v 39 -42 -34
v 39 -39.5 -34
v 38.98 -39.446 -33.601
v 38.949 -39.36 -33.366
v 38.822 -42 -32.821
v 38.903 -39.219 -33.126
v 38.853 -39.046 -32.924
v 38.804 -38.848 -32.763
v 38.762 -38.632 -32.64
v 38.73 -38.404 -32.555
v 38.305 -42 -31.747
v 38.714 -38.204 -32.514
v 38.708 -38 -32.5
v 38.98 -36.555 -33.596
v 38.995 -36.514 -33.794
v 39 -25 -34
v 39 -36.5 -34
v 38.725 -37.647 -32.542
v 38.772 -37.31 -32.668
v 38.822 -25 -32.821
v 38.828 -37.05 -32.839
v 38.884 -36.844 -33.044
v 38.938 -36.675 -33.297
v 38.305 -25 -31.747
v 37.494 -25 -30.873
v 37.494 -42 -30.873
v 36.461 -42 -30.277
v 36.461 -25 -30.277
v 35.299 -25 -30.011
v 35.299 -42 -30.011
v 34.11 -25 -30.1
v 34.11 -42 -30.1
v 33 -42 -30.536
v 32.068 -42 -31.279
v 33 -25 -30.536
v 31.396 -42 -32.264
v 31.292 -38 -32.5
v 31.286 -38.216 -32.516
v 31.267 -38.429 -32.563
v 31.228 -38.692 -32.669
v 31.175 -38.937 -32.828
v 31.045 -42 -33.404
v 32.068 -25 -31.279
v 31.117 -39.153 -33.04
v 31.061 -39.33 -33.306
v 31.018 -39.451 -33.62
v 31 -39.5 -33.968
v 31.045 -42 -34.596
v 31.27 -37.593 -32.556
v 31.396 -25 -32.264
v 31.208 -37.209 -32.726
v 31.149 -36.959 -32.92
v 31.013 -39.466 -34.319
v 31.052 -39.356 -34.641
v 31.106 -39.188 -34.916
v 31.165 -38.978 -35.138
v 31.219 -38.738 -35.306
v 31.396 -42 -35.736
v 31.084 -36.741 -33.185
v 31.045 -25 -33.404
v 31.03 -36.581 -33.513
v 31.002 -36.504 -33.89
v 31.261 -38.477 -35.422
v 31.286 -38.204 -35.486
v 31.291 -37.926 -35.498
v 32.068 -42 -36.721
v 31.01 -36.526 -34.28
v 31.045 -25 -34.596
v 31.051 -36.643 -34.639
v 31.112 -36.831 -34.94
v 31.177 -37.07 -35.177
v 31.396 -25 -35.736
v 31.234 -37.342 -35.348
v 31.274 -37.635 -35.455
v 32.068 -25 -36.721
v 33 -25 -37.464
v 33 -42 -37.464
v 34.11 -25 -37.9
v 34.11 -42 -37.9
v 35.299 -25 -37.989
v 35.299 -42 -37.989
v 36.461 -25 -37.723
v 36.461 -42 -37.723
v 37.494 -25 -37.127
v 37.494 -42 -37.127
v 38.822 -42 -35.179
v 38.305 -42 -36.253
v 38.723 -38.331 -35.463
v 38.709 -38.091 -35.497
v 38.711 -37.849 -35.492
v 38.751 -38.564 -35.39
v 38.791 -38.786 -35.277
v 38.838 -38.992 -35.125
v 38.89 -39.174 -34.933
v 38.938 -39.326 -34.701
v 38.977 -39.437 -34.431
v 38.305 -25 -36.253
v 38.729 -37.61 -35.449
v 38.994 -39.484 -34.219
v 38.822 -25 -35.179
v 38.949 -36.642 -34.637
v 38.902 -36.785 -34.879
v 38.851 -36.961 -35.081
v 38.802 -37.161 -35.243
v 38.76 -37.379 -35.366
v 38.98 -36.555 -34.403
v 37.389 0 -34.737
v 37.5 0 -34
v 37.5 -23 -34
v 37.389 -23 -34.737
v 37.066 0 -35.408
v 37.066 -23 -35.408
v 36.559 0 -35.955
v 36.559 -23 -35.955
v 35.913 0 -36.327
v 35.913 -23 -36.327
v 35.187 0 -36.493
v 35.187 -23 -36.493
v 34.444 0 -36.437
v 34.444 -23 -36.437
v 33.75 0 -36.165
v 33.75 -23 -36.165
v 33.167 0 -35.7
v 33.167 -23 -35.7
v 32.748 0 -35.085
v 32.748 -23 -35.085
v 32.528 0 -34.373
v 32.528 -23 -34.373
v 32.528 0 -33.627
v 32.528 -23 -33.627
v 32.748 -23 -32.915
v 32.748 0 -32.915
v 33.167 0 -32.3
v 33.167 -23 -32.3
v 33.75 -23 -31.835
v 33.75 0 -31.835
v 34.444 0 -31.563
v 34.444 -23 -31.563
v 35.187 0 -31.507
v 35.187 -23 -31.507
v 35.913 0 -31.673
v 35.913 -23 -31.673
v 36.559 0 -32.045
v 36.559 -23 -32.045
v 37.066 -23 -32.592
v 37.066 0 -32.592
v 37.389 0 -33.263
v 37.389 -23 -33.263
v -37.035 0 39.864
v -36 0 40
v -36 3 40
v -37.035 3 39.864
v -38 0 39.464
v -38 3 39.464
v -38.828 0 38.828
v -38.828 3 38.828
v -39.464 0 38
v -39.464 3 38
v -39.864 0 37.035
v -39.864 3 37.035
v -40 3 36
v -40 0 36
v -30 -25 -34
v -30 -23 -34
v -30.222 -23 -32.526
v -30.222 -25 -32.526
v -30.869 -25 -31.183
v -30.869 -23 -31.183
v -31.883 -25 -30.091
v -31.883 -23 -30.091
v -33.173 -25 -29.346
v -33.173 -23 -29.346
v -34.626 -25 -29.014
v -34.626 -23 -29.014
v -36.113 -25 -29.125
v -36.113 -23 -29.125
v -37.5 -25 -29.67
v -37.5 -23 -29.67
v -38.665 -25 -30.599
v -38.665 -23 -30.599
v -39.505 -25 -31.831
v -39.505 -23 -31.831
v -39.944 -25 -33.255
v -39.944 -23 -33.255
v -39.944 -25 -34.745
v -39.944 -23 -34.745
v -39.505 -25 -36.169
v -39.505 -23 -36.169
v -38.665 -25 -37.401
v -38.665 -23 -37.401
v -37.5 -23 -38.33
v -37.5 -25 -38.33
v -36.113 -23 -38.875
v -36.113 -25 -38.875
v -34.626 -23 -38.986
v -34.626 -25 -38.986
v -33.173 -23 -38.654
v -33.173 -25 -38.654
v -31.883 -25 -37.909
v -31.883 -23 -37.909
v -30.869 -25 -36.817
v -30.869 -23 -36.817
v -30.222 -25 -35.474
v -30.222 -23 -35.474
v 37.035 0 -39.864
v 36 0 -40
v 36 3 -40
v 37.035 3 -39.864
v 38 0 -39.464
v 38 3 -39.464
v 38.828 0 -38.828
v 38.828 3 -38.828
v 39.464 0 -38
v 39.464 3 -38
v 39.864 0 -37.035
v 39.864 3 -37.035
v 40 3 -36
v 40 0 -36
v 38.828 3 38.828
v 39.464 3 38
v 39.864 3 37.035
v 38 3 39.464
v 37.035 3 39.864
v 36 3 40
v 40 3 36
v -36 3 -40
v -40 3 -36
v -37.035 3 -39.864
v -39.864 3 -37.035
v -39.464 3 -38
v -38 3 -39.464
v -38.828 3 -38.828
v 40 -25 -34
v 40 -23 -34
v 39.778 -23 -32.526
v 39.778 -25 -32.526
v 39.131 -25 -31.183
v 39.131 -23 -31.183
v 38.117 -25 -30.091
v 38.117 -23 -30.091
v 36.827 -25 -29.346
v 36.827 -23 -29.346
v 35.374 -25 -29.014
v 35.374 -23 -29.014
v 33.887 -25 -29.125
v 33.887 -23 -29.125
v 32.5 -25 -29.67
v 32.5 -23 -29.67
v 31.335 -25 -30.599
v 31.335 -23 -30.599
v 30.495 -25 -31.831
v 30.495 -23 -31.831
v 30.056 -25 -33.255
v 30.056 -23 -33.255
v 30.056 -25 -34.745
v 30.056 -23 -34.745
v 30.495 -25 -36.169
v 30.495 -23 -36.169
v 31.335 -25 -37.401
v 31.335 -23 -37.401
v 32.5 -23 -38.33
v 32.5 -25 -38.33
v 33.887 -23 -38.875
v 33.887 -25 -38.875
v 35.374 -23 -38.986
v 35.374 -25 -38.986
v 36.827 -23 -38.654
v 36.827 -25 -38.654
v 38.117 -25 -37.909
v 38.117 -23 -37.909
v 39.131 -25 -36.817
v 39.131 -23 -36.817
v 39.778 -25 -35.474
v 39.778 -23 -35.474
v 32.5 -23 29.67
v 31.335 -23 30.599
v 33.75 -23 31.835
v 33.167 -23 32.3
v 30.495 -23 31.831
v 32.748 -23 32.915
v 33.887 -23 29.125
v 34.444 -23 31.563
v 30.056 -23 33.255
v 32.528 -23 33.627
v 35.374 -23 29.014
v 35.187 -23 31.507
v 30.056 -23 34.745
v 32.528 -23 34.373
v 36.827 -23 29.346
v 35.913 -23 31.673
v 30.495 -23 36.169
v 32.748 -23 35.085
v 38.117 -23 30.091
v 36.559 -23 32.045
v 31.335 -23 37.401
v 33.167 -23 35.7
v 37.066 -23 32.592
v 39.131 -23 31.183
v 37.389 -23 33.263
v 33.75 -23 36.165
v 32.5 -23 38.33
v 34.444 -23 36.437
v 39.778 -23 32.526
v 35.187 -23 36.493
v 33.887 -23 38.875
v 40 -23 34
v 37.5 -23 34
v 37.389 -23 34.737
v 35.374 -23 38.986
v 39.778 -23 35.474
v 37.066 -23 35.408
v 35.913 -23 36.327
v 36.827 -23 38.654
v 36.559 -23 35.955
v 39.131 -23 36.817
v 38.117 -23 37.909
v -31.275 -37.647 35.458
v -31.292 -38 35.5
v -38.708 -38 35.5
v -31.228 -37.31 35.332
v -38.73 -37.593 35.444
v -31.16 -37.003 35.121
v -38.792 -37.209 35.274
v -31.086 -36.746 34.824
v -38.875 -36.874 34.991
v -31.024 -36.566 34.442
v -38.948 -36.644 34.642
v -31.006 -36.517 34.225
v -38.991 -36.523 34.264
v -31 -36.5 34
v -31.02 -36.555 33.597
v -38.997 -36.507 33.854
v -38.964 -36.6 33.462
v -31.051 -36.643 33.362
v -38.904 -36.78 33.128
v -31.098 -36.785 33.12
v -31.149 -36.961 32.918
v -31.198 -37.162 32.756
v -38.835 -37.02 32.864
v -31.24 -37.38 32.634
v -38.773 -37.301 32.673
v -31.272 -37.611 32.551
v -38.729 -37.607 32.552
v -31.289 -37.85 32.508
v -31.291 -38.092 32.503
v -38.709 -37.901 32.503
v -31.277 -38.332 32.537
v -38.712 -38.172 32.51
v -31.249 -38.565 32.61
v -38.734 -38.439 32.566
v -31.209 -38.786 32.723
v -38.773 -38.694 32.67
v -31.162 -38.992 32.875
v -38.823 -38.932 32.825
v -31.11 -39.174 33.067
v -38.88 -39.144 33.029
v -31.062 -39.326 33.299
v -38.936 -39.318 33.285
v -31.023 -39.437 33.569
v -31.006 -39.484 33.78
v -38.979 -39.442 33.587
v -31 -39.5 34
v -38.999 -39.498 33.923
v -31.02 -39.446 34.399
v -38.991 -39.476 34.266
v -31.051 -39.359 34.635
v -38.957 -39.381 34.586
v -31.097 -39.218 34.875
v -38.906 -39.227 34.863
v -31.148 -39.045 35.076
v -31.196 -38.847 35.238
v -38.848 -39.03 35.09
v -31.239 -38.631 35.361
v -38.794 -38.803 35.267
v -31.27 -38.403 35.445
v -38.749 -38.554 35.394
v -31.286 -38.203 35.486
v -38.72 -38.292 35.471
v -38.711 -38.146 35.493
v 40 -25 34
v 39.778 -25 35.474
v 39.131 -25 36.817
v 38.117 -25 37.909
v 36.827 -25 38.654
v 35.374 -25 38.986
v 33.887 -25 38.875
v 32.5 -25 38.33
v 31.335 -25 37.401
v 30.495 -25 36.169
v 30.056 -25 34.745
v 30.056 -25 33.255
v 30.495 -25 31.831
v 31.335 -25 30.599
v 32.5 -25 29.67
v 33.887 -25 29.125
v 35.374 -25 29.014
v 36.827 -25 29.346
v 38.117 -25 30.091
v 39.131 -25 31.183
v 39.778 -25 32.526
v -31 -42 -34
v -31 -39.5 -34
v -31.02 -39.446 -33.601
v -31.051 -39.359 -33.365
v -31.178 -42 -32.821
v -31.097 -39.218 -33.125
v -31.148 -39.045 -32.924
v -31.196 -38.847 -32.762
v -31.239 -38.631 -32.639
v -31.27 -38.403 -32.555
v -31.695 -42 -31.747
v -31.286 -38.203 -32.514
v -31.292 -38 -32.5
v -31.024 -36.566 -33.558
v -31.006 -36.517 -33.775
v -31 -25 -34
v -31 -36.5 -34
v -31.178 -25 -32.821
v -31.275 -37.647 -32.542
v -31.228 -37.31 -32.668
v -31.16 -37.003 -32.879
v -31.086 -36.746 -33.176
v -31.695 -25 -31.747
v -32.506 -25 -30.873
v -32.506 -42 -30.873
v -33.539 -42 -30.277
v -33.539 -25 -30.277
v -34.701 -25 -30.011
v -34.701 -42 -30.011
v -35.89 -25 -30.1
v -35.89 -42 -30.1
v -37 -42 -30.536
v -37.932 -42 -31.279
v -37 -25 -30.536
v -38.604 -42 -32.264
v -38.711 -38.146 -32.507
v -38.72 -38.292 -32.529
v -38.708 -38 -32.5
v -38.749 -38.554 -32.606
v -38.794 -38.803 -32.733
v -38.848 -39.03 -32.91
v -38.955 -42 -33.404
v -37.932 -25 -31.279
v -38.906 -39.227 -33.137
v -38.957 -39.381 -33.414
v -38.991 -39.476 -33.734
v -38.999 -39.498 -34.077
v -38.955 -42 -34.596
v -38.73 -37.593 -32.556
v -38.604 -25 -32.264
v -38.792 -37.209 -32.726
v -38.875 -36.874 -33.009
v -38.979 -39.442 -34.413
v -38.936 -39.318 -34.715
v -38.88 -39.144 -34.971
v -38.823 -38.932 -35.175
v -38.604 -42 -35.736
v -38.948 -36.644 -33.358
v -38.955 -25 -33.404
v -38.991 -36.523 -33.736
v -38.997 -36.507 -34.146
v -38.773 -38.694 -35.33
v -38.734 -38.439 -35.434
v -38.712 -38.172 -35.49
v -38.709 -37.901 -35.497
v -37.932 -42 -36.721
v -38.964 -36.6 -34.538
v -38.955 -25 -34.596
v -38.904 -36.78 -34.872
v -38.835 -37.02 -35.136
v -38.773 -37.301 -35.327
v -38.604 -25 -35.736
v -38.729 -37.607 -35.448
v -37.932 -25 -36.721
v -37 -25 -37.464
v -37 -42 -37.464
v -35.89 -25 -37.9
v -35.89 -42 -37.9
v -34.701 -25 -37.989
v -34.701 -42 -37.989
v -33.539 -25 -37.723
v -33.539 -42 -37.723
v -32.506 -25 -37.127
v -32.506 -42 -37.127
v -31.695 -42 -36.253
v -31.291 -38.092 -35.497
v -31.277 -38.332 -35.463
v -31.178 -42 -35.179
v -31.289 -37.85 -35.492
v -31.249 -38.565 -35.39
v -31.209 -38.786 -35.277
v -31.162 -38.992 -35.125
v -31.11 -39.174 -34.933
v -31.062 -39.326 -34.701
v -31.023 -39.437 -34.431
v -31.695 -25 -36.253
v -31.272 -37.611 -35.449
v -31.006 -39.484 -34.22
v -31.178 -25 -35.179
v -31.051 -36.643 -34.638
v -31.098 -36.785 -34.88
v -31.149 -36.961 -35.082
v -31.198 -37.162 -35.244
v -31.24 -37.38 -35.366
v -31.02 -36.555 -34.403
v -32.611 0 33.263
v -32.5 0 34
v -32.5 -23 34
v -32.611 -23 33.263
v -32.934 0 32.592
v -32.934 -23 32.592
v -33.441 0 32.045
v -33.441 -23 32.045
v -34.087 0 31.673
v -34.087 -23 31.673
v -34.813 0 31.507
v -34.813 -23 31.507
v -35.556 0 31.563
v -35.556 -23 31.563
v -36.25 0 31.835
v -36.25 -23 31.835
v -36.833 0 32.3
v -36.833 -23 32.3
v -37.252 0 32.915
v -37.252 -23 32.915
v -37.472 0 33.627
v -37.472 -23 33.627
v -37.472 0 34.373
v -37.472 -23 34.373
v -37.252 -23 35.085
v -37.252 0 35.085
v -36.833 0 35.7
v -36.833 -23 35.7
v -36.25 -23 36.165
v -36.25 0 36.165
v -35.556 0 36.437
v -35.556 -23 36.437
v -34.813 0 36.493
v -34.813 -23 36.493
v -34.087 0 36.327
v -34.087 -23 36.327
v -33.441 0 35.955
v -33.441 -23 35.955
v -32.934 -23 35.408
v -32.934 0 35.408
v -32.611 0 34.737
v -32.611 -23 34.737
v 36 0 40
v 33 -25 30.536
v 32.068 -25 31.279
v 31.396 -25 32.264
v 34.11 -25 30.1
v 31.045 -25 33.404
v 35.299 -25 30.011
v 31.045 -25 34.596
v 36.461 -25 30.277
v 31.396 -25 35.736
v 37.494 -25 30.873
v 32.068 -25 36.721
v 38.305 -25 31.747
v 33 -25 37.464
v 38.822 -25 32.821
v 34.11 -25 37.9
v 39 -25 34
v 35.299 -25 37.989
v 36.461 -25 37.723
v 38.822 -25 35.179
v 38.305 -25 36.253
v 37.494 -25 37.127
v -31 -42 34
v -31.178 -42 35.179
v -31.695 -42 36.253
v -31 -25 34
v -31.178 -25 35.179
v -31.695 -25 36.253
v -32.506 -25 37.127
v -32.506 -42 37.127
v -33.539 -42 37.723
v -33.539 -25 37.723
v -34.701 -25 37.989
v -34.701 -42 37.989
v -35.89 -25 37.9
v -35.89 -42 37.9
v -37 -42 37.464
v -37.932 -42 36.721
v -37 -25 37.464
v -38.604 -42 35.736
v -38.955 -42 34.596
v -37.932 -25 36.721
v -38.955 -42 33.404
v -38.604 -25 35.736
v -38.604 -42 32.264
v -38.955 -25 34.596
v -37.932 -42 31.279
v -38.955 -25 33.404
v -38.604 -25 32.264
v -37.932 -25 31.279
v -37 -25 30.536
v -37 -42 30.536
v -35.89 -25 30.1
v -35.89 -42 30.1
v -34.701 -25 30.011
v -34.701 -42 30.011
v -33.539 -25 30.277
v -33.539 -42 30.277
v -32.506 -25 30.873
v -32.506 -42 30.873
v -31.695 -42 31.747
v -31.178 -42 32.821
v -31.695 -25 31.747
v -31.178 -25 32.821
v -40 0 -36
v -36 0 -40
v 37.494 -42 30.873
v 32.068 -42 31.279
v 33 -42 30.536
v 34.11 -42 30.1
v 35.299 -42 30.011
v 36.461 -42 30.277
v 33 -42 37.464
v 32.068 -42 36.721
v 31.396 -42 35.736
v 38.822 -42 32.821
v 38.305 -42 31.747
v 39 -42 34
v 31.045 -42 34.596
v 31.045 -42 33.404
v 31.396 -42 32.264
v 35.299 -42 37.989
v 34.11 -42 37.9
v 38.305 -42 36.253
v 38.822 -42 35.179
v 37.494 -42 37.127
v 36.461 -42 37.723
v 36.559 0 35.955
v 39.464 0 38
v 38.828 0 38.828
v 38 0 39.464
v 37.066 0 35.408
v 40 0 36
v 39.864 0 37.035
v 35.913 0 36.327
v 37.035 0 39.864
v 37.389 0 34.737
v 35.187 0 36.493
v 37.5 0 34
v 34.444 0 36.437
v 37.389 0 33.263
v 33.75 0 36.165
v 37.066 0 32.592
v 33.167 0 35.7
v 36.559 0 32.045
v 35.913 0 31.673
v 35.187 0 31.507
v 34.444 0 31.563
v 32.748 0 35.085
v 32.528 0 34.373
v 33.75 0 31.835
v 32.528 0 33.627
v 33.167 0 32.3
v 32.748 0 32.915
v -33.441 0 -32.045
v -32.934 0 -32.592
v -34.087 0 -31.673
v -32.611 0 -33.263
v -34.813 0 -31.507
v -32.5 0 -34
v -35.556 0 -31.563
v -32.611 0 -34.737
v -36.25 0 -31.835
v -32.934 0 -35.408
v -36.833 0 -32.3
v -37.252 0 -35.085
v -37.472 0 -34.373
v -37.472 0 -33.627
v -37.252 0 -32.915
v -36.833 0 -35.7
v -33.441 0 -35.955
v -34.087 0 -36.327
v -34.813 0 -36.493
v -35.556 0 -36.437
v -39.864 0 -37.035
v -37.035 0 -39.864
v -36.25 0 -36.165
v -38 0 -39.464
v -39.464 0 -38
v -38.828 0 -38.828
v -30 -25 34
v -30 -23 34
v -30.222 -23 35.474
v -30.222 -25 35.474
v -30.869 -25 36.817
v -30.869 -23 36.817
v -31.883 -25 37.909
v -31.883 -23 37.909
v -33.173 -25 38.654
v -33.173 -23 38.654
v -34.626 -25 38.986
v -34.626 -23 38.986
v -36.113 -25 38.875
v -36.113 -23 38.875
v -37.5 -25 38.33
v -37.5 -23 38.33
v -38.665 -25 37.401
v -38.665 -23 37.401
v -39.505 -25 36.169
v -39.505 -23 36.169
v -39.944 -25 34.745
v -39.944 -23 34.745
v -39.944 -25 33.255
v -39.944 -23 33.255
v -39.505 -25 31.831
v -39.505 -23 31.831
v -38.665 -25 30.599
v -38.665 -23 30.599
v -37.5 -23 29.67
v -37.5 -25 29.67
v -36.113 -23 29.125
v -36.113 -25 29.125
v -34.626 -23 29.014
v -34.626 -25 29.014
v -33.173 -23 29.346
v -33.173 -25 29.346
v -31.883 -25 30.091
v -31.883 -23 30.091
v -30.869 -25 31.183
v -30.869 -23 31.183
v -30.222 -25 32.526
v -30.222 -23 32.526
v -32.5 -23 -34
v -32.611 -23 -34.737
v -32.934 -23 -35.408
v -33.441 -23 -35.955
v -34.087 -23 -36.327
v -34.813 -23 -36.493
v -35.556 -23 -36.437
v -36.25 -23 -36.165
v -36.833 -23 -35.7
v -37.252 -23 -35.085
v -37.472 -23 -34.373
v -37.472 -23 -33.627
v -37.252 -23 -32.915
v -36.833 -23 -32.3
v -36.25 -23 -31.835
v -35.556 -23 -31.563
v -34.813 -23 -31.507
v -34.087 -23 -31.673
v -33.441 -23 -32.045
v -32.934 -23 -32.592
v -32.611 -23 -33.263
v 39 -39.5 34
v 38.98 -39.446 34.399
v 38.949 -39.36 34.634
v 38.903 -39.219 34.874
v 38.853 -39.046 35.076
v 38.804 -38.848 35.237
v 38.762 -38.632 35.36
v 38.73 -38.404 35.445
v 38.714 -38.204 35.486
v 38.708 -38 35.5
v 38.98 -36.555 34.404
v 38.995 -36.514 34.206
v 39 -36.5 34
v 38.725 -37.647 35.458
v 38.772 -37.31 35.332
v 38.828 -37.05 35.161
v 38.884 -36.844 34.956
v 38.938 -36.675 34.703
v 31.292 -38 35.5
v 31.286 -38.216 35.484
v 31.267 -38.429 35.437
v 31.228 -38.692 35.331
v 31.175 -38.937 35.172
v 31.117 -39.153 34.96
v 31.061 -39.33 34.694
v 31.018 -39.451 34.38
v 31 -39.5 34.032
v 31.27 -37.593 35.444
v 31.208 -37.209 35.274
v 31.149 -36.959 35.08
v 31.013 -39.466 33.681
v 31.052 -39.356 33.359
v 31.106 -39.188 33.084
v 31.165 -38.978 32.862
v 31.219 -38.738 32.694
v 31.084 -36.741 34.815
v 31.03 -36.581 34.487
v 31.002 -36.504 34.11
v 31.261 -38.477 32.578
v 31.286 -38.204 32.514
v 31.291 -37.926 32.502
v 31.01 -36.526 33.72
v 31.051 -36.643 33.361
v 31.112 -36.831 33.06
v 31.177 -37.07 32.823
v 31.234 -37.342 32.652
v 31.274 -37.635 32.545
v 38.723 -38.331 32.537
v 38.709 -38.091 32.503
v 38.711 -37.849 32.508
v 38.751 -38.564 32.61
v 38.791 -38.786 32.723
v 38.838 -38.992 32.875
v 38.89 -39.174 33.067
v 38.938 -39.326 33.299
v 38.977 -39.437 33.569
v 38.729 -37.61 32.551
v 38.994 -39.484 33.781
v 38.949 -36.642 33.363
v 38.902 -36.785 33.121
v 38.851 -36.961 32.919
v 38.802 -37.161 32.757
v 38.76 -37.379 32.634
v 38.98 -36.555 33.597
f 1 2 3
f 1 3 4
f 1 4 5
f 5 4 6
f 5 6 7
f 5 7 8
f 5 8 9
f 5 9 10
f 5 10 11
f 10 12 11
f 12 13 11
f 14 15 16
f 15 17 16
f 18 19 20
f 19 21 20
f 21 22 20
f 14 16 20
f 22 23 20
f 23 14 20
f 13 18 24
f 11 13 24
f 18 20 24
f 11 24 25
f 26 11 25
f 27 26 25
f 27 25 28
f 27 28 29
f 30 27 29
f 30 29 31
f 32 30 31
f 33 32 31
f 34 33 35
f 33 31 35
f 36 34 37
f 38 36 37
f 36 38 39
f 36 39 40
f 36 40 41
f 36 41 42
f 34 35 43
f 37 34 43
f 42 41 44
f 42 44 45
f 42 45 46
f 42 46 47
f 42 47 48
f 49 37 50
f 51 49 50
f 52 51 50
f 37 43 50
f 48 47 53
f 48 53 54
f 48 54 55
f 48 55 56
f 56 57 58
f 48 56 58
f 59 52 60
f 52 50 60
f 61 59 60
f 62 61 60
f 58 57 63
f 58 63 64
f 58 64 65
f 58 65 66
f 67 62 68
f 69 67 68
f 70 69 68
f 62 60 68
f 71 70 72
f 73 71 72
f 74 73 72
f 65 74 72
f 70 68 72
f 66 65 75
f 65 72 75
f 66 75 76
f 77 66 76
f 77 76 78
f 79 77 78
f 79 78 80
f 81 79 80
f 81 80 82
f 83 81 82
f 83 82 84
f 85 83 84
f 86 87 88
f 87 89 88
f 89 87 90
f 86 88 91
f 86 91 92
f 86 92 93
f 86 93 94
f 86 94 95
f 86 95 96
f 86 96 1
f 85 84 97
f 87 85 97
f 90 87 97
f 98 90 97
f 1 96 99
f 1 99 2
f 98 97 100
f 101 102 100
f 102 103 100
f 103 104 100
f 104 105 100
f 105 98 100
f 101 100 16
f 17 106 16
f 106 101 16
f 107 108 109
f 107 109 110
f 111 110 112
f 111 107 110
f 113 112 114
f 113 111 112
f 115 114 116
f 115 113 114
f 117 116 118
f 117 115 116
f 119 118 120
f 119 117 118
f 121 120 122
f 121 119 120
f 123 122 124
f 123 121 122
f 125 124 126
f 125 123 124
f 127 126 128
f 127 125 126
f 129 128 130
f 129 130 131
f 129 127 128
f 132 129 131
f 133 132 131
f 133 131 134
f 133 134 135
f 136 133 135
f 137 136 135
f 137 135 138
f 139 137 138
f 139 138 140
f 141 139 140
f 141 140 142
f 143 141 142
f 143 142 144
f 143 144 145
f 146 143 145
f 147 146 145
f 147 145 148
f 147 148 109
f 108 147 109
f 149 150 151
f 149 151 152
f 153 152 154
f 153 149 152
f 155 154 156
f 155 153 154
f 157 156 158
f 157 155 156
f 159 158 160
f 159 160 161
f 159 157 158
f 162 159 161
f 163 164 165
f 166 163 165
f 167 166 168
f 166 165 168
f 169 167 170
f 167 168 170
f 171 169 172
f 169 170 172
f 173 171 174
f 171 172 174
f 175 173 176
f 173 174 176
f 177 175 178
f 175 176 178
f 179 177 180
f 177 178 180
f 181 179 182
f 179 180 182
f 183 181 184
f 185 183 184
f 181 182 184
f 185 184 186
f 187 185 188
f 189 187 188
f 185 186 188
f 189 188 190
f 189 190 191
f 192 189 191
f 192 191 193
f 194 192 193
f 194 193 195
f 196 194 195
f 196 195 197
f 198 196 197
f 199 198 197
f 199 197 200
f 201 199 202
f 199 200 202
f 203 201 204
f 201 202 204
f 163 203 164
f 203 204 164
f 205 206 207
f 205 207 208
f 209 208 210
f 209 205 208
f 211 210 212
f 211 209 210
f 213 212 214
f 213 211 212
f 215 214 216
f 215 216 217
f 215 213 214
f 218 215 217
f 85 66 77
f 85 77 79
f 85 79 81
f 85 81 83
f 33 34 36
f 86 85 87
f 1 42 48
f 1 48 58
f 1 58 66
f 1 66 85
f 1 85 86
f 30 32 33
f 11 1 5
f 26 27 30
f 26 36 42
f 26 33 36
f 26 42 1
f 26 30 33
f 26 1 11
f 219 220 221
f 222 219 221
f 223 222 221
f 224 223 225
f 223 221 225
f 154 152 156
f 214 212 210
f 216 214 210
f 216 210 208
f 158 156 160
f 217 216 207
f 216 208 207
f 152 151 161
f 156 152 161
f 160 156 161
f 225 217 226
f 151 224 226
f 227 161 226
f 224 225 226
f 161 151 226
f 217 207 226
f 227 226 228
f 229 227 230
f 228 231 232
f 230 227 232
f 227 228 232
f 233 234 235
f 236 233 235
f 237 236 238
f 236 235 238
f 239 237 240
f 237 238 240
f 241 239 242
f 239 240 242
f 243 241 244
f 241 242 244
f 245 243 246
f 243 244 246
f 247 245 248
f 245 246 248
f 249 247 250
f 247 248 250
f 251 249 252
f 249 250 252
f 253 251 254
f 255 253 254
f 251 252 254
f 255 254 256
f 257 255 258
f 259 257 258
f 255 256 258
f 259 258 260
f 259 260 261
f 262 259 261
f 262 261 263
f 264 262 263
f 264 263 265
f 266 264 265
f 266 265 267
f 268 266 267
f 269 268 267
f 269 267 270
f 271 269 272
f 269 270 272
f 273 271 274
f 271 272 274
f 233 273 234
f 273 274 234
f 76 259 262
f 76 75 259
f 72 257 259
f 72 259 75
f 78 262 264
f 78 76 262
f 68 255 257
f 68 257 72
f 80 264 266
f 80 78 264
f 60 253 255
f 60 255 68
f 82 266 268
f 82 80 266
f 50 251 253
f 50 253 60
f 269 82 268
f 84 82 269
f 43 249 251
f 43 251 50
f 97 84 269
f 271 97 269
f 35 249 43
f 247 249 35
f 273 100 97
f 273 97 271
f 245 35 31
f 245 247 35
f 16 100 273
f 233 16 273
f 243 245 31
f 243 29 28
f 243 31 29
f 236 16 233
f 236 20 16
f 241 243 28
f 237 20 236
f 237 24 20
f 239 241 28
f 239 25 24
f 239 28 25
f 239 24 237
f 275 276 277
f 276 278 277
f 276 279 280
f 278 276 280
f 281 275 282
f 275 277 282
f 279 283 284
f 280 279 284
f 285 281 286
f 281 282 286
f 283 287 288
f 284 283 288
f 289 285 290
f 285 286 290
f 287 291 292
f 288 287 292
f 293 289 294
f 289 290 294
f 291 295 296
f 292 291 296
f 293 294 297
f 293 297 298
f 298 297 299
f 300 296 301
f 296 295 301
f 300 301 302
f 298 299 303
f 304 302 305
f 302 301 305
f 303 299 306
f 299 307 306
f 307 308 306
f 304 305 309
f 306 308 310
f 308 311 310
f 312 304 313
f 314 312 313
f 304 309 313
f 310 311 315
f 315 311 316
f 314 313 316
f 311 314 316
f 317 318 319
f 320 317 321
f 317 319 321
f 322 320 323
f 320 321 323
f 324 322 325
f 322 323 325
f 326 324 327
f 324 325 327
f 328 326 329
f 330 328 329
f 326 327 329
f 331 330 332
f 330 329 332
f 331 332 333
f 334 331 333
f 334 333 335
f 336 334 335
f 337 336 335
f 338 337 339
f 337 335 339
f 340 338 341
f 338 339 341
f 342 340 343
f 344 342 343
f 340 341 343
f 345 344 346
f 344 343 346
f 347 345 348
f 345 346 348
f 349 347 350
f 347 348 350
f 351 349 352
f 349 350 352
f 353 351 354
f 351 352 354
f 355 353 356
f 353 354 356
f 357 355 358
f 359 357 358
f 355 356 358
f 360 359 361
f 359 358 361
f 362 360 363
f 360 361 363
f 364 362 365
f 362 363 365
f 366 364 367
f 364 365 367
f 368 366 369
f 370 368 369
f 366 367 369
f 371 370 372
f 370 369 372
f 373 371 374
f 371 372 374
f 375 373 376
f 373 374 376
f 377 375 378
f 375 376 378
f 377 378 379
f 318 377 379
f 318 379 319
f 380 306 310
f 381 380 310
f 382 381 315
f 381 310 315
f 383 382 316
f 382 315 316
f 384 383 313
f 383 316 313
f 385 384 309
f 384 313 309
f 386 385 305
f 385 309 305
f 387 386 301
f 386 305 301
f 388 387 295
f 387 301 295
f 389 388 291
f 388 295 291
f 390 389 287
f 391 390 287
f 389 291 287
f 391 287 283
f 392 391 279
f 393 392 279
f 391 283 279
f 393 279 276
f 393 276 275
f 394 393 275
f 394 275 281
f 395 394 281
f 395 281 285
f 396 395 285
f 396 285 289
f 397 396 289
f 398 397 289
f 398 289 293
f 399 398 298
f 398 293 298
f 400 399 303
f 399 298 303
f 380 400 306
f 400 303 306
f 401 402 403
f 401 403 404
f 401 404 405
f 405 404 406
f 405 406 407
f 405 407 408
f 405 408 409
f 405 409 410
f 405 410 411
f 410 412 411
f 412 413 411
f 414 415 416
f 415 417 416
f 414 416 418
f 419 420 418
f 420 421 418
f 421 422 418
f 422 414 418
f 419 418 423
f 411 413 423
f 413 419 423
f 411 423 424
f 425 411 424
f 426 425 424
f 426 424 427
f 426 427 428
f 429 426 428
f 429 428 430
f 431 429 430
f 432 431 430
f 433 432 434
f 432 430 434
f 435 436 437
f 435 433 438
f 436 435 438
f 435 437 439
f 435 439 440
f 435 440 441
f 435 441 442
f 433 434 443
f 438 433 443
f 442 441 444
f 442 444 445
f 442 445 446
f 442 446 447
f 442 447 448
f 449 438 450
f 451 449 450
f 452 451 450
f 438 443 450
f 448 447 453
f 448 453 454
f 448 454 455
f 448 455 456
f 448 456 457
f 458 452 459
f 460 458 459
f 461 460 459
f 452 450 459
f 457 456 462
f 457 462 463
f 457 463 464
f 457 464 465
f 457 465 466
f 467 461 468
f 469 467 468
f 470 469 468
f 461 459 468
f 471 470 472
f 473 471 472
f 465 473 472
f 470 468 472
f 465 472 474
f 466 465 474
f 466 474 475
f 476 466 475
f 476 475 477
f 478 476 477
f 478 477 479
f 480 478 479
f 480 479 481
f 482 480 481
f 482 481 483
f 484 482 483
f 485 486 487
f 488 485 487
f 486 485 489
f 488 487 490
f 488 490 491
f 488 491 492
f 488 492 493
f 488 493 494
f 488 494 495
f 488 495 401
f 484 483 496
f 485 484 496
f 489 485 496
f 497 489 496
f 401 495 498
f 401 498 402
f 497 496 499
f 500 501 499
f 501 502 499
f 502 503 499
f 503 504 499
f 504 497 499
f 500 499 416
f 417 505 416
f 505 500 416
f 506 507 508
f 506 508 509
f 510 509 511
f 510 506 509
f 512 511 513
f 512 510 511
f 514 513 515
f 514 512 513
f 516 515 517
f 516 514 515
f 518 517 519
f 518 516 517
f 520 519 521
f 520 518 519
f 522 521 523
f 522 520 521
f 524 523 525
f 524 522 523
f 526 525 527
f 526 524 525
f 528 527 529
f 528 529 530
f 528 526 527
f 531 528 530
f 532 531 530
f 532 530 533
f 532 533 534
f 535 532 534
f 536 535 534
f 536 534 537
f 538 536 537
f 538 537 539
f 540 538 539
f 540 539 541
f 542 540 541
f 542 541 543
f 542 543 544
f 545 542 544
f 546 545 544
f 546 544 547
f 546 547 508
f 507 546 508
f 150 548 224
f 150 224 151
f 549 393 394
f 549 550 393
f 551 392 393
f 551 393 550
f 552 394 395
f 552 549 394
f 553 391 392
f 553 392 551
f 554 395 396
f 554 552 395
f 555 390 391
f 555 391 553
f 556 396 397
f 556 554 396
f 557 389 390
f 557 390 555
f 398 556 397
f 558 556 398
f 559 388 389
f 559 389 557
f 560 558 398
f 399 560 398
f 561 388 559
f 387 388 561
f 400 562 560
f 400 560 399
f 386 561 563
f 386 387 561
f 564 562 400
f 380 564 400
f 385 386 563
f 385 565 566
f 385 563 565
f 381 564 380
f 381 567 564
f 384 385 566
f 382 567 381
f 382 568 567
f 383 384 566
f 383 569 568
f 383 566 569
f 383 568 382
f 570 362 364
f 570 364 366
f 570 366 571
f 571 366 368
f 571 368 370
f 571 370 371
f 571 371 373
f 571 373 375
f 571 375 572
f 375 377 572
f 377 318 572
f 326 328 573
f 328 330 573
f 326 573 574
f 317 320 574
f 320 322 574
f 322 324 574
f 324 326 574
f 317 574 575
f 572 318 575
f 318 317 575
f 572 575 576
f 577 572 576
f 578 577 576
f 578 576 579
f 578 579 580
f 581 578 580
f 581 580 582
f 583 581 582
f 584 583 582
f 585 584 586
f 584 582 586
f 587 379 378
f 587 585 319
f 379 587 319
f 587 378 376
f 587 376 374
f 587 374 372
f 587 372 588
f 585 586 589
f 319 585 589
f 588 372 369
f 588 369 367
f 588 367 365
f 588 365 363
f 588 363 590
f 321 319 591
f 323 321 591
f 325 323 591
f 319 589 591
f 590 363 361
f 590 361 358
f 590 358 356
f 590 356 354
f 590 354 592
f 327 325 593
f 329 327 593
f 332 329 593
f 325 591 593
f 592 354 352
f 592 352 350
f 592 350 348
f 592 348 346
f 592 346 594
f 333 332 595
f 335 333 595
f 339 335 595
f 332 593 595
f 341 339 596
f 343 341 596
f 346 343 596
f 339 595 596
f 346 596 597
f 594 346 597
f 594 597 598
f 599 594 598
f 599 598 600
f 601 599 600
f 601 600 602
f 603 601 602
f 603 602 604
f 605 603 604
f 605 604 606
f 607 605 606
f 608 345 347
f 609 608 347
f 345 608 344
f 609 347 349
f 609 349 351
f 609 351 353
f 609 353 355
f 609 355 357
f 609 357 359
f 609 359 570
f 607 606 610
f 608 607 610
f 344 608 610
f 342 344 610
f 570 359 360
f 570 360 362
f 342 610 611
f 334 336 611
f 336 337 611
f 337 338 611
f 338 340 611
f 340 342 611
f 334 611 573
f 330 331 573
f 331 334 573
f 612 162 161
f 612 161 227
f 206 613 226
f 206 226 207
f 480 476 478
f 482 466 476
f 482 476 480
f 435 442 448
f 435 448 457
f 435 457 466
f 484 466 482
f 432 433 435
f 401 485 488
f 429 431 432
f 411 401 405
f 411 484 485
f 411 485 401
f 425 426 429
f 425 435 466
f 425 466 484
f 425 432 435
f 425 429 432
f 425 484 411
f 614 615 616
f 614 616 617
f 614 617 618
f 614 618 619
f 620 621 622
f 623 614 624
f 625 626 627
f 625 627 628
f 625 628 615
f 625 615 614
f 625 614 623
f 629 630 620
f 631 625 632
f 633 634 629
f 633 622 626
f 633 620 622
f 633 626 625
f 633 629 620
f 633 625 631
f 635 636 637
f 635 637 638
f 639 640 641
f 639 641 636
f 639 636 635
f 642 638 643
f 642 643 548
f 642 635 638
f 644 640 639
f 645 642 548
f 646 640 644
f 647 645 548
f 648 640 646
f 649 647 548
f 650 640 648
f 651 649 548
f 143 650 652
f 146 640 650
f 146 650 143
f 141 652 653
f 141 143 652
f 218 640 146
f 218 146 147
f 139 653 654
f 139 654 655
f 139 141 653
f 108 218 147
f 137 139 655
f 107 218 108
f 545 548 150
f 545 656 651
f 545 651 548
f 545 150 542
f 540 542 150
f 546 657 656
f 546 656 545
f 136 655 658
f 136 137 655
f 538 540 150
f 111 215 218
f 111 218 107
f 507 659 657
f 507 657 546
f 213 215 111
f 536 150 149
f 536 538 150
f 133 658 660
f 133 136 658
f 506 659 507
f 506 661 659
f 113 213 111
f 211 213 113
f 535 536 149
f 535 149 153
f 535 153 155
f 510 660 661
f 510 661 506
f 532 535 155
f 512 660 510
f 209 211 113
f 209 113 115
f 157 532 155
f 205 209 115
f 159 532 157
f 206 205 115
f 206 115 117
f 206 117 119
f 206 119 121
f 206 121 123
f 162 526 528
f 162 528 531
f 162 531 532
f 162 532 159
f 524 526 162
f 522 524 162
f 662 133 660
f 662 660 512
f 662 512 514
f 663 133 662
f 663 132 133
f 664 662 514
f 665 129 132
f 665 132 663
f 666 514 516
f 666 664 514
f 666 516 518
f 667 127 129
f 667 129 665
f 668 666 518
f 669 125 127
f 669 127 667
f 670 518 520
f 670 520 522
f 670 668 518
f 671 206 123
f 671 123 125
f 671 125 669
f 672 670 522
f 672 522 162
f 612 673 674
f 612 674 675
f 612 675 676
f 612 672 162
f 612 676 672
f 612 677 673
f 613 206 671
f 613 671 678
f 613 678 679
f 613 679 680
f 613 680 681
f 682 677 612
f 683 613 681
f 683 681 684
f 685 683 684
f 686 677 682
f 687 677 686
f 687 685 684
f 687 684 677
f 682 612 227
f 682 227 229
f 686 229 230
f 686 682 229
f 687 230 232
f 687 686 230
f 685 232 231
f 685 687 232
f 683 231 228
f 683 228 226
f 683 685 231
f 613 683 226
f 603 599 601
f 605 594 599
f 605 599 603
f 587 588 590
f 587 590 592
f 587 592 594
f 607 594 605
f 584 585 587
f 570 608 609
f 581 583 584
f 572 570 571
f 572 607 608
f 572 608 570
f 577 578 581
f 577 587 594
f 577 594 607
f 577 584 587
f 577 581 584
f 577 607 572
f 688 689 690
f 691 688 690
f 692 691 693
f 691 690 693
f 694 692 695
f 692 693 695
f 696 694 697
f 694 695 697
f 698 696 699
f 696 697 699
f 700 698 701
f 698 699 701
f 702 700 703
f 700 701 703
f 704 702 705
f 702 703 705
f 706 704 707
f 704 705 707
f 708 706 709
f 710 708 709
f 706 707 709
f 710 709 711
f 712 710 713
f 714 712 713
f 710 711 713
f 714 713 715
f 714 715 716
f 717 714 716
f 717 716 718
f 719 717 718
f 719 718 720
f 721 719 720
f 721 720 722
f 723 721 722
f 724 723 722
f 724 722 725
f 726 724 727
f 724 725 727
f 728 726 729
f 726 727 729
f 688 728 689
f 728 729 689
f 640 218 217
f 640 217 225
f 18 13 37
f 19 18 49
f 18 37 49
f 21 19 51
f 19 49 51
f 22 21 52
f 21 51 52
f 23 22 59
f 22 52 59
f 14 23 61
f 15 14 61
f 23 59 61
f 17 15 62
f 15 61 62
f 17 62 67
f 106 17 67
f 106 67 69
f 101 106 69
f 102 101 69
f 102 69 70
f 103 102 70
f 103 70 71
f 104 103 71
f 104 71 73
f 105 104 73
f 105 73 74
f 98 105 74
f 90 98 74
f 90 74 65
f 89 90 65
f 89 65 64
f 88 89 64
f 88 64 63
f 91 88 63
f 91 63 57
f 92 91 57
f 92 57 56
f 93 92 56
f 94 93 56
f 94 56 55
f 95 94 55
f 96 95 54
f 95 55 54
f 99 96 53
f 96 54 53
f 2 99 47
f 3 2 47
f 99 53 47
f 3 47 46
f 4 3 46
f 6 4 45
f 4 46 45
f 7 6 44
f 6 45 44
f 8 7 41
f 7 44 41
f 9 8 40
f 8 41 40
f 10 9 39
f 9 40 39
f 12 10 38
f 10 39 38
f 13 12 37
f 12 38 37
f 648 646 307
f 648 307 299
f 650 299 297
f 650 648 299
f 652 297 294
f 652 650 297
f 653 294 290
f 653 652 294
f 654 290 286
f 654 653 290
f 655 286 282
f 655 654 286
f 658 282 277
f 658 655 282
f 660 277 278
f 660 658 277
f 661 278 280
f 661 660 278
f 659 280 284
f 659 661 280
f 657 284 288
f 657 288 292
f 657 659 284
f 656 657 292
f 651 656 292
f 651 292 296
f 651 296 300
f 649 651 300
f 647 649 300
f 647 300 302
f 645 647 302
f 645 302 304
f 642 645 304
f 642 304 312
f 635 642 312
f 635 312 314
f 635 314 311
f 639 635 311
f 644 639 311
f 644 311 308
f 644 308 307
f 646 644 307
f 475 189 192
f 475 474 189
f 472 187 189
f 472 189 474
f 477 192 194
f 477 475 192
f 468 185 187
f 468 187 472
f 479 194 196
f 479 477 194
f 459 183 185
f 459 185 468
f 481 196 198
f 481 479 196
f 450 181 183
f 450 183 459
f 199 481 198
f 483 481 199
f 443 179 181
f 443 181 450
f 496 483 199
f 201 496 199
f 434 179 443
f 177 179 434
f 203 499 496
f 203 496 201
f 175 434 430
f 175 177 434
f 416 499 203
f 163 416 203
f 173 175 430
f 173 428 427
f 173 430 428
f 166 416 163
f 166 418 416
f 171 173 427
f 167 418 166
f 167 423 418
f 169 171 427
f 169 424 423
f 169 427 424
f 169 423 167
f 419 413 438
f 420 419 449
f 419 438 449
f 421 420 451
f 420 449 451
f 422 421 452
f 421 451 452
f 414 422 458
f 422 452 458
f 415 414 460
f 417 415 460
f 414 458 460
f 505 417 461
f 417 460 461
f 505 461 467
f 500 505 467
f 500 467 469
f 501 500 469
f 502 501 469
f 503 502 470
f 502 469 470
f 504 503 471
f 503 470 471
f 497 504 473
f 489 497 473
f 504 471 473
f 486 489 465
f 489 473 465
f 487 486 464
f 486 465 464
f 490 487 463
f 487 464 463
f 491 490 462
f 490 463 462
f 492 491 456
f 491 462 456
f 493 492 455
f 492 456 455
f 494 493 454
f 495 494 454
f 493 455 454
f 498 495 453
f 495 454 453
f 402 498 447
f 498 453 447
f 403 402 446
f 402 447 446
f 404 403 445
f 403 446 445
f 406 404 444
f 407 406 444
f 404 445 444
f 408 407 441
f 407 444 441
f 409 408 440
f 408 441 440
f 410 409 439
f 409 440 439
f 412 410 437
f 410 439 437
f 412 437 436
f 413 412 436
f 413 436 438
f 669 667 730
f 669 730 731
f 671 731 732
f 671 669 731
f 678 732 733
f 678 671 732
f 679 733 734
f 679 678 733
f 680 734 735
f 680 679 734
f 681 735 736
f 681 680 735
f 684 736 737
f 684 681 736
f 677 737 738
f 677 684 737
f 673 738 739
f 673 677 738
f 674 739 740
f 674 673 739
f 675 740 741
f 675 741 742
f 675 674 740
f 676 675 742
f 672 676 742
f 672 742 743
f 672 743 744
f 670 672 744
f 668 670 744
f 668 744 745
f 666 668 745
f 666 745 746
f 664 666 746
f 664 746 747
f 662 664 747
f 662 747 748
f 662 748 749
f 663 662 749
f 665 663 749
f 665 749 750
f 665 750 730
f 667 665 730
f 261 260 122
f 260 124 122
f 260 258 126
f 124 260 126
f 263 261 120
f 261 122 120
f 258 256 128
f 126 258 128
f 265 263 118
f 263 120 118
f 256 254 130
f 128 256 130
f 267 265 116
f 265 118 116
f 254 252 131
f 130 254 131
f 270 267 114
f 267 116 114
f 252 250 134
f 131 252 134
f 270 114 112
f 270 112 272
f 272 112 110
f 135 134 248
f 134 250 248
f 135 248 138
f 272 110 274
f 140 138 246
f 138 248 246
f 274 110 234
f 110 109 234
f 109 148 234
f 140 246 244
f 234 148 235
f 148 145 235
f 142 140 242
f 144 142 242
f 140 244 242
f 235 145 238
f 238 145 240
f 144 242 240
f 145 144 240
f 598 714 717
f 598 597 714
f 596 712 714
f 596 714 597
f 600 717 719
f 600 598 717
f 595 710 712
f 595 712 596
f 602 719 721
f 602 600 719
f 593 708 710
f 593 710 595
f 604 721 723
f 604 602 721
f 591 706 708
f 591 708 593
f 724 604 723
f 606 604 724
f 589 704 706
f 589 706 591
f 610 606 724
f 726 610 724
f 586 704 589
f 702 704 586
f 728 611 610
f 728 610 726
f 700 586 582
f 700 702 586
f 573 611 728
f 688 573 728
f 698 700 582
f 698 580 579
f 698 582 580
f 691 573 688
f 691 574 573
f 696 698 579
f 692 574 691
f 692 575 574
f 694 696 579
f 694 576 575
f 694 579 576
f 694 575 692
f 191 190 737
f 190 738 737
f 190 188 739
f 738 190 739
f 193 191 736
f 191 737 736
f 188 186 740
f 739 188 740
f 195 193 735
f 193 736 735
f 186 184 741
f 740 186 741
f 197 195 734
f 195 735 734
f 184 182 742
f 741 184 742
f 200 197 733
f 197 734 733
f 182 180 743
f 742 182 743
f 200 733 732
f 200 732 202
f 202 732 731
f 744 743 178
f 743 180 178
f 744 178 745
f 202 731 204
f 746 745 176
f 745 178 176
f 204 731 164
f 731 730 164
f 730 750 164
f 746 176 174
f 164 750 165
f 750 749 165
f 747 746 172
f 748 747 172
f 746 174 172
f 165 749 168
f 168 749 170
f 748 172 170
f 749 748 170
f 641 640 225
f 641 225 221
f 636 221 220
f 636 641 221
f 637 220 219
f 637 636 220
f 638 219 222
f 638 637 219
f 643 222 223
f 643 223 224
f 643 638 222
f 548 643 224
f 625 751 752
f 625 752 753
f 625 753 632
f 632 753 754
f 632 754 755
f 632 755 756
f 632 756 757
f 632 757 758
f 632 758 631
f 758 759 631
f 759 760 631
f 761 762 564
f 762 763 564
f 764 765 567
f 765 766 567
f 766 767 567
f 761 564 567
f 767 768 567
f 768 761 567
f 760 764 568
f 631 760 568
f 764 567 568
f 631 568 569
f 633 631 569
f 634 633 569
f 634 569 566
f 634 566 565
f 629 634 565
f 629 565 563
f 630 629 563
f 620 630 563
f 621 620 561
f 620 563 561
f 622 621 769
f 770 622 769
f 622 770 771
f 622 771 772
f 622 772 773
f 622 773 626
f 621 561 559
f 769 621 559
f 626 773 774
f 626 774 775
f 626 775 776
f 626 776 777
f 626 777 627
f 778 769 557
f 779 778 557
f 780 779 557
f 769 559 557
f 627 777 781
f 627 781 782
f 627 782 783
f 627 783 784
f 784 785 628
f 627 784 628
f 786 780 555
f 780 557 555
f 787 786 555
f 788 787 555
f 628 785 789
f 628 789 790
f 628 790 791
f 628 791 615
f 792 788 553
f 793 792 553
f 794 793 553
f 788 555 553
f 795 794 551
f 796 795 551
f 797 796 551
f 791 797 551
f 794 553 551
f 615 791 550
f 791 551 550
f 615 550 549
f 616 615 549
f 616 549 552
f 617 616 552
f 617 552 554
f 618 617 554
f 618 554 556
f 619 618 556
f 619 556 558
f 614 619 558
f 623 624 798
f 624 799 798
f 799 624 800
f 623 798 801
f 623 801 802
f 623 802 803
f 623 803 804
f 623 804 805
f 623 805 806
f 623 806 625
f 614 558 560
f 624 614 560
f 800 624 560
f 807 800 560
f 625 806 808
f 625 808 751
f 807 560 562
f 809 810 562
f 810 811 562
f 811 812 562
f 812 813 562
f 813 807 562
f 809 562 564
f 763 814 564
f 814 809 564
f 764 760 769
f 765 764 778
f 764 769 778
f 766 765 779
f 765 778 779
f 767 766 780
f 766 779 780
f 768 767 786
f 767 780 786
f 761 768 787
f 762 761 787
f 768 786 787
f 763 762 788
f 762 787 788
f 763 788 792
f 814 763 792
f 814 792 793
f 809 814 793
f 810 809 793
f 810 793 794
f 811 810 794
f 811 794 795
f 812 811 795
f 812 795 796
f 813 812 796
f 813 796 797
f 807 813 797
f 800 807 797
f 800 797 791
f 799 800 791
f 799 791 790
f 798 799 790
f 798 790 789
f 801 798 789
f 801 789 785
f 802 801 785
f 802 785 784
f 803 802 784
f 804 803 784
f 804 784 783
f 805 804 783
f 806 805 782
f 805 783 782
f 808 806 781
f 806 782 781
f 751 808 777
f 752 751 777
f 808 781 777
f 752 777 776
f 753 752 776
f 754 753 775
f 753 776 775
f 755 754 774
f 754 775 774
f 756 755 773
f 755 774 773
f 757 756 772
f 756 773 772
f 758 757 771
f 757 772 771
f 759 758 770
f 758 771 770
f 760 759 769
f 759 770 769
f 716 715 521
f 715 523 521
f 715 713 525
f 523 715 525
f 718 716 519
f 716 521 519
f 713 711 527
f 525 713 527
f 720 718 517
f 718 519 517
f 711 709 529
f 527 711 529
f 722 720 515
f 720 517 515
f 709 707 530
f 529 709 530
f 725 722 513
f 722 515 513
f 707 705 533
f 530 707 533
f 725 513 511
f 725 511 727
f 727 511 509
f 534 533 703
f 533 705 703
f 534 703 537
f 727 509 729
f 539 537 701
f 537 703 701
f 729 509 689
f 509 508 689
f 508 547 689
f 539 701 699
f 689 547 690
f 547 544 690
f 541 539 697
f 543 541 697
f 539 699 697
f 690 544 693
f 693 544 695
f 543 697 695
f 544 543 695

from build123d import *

# Parameters (mm, degrees)
SKETCH1_R               = 2.5
BOSS_EXTRUDE1_DEPTH     = 3
SKETCH1_3_R             = 2.5
BOSS_EXTRUDE2_DEPTH     = 42
SKETCH2_R               = 1.5
CUT_EXTRUDE1_DEPTH      = 147
BOSS_EXTRUDE3_START     = 23
SKETCH3_R               = 5
BOSS_EXTRUDE3_DEPTH     = 2
SKETCH4_R               = 4
BOSS_EXTRUDE4_DEPTH     = 17
SKETCH2_3_R             = 1.5
CUT_EXTRUDE2_DEPTH      = 101
CUT_EXTRUDE2_DEPTH_BACK = 130


with BuildPart() as part:
    # Sketch1 → Boss-Extrude1 (new body)
    with BuildSketch(Plane(origin=(0, 0, 0), x_dir=(1, 0, 0), z_dir=(0, 1, 0))):
        with BuildLine():
            ThreePointArc((-40, 36), (-38.828427125, 38.828427125), (-36, 40))
            Line((-36, 40), (36, 40))
            ThreePointArc((36, 40), (38.828427125, 38.828427125), (40, 36))
            Line((40, 36), (40, -36))
            ThreePointArc((40, -36), (38.828427125, -38.828427125), (36, -40))
            Line((36, -40), (-36, -40))
            ThreePointArc((-36, -40), (-38.828427125, -38.828427125), (-40, -36))
            Line((-40, -36), (-40, 36))
        make_face()
        with Locations((35, 34)):
            Circle(SKETCH1_R, mode=Mode.SUBTRACT)
        with Locations((35, -34)):
            Circle(SKETCH1_R, mode=Mode.SUBTRACT)
        with Locations((-35, -34)):
            Circle(SKETCH1_R, mode=Mode.SUBTRACT)
        with Locations((-35, 34)):
            Circle(SKETCH1_R, mode=Mode.SUBTRACT)
        with Locations((-35, 34)):
            Circle(SKETCH1_R)
        with Locations((35, 34)):
            Circle(SKETCH1_R)
        with Locations((-35, -34)):
            Circle(SKETCH1_R)
        with Locations((35, -34)):
            Circle(SKETCH1_R)
    extrude(amount=BOSS_EXTRUDE1_DEPTH)

    # Sketch1<3> → Boss-Extrude2 (add)
    with BuildSketch(Plane(origin=(0, 0, 0), x_dir=(1, 0, 0), z_dir=(0, 1, 0))):
        with Locations((-35, 34)):
            Circle(SKETCH1_3_R)
        with Locations((-35, -34)):
            Circle(SKETCH1_3_R)
        with Locations((35, -34)):
            Circle(SKETCH1_3_R)
        with Locations((35, 34)):
            Circle(SKETCH1_3_R)
    extrude(amount=-BOSS_EXTRUDE2_DEPTH)

    # Sketch2 → Cut-Extrude1 (cut)
    with BuildSketch(Plane.ZY.offset(37.5)):
        with Locations((-34, -38)):
            Circle(SKETCH2_R)
        with Locations((34, -38)):
            Circle(SKETCH2_R)
    extrude(amount=-CUT_EXTRUDE1_DEPTH, mode=Mode.SUBTRACT)

    # Sketch3 → Boss-Extrude3 (add)
    with BuildSketch(Plane.XZ.offset(BOSS_EXTRUDE3_START)):
        with Locations((35, 34)):
            Circle(SKETCH3_R)
        with Locations((-35, 34)):
            Circle(SKETCH3_R)
        with Locations((-35, -34)):
            Circle(SKETCH3_R)
        with Locations((35, -34)):
            Circle(SKETCH3_R)
    extrude(amount=BOSS_EXTRUDE3_DEPTH)

    # Sketch4 → Boss-Extrude4 (add)
    with BuildSketch(Plane.XZ.offset(25)):
        with Locations((-35, 34)):
            Circle(SKETCH4_R)
        with Locations((35, 34)):
            Circle(SKETCH4_R)
        with Locations((-35, -34)):
            Circle(SKETCH4_R)
        with Locations((35, -34)):
            Circle(SKETCH4_R)
    extrude(amount=BOSS_EXTRUDE4_DEPTH)

    # Sketch2<3> → Cut-Extrude2 (cut, two sides)
    with BuildSketch(Plane.ZY.offset(37.5)) as cut_extrude2_sk:
        with Locations((-34, -38)):
            Circle(SKETCH2_3_R)
        with Locations((34, -38)):
            Circle(SKETCH2_3_R)
    extrude(amount=CUT_EXTRUDE2_DEPTH, mode=Mode.SUBTRACT)
    extrude(cut_extrude2_sk.sketch, amount=-CUT_EXTRUDE2_DEPTH_BACK, mode=Mode.SUBTRACT)


solid = part.part
